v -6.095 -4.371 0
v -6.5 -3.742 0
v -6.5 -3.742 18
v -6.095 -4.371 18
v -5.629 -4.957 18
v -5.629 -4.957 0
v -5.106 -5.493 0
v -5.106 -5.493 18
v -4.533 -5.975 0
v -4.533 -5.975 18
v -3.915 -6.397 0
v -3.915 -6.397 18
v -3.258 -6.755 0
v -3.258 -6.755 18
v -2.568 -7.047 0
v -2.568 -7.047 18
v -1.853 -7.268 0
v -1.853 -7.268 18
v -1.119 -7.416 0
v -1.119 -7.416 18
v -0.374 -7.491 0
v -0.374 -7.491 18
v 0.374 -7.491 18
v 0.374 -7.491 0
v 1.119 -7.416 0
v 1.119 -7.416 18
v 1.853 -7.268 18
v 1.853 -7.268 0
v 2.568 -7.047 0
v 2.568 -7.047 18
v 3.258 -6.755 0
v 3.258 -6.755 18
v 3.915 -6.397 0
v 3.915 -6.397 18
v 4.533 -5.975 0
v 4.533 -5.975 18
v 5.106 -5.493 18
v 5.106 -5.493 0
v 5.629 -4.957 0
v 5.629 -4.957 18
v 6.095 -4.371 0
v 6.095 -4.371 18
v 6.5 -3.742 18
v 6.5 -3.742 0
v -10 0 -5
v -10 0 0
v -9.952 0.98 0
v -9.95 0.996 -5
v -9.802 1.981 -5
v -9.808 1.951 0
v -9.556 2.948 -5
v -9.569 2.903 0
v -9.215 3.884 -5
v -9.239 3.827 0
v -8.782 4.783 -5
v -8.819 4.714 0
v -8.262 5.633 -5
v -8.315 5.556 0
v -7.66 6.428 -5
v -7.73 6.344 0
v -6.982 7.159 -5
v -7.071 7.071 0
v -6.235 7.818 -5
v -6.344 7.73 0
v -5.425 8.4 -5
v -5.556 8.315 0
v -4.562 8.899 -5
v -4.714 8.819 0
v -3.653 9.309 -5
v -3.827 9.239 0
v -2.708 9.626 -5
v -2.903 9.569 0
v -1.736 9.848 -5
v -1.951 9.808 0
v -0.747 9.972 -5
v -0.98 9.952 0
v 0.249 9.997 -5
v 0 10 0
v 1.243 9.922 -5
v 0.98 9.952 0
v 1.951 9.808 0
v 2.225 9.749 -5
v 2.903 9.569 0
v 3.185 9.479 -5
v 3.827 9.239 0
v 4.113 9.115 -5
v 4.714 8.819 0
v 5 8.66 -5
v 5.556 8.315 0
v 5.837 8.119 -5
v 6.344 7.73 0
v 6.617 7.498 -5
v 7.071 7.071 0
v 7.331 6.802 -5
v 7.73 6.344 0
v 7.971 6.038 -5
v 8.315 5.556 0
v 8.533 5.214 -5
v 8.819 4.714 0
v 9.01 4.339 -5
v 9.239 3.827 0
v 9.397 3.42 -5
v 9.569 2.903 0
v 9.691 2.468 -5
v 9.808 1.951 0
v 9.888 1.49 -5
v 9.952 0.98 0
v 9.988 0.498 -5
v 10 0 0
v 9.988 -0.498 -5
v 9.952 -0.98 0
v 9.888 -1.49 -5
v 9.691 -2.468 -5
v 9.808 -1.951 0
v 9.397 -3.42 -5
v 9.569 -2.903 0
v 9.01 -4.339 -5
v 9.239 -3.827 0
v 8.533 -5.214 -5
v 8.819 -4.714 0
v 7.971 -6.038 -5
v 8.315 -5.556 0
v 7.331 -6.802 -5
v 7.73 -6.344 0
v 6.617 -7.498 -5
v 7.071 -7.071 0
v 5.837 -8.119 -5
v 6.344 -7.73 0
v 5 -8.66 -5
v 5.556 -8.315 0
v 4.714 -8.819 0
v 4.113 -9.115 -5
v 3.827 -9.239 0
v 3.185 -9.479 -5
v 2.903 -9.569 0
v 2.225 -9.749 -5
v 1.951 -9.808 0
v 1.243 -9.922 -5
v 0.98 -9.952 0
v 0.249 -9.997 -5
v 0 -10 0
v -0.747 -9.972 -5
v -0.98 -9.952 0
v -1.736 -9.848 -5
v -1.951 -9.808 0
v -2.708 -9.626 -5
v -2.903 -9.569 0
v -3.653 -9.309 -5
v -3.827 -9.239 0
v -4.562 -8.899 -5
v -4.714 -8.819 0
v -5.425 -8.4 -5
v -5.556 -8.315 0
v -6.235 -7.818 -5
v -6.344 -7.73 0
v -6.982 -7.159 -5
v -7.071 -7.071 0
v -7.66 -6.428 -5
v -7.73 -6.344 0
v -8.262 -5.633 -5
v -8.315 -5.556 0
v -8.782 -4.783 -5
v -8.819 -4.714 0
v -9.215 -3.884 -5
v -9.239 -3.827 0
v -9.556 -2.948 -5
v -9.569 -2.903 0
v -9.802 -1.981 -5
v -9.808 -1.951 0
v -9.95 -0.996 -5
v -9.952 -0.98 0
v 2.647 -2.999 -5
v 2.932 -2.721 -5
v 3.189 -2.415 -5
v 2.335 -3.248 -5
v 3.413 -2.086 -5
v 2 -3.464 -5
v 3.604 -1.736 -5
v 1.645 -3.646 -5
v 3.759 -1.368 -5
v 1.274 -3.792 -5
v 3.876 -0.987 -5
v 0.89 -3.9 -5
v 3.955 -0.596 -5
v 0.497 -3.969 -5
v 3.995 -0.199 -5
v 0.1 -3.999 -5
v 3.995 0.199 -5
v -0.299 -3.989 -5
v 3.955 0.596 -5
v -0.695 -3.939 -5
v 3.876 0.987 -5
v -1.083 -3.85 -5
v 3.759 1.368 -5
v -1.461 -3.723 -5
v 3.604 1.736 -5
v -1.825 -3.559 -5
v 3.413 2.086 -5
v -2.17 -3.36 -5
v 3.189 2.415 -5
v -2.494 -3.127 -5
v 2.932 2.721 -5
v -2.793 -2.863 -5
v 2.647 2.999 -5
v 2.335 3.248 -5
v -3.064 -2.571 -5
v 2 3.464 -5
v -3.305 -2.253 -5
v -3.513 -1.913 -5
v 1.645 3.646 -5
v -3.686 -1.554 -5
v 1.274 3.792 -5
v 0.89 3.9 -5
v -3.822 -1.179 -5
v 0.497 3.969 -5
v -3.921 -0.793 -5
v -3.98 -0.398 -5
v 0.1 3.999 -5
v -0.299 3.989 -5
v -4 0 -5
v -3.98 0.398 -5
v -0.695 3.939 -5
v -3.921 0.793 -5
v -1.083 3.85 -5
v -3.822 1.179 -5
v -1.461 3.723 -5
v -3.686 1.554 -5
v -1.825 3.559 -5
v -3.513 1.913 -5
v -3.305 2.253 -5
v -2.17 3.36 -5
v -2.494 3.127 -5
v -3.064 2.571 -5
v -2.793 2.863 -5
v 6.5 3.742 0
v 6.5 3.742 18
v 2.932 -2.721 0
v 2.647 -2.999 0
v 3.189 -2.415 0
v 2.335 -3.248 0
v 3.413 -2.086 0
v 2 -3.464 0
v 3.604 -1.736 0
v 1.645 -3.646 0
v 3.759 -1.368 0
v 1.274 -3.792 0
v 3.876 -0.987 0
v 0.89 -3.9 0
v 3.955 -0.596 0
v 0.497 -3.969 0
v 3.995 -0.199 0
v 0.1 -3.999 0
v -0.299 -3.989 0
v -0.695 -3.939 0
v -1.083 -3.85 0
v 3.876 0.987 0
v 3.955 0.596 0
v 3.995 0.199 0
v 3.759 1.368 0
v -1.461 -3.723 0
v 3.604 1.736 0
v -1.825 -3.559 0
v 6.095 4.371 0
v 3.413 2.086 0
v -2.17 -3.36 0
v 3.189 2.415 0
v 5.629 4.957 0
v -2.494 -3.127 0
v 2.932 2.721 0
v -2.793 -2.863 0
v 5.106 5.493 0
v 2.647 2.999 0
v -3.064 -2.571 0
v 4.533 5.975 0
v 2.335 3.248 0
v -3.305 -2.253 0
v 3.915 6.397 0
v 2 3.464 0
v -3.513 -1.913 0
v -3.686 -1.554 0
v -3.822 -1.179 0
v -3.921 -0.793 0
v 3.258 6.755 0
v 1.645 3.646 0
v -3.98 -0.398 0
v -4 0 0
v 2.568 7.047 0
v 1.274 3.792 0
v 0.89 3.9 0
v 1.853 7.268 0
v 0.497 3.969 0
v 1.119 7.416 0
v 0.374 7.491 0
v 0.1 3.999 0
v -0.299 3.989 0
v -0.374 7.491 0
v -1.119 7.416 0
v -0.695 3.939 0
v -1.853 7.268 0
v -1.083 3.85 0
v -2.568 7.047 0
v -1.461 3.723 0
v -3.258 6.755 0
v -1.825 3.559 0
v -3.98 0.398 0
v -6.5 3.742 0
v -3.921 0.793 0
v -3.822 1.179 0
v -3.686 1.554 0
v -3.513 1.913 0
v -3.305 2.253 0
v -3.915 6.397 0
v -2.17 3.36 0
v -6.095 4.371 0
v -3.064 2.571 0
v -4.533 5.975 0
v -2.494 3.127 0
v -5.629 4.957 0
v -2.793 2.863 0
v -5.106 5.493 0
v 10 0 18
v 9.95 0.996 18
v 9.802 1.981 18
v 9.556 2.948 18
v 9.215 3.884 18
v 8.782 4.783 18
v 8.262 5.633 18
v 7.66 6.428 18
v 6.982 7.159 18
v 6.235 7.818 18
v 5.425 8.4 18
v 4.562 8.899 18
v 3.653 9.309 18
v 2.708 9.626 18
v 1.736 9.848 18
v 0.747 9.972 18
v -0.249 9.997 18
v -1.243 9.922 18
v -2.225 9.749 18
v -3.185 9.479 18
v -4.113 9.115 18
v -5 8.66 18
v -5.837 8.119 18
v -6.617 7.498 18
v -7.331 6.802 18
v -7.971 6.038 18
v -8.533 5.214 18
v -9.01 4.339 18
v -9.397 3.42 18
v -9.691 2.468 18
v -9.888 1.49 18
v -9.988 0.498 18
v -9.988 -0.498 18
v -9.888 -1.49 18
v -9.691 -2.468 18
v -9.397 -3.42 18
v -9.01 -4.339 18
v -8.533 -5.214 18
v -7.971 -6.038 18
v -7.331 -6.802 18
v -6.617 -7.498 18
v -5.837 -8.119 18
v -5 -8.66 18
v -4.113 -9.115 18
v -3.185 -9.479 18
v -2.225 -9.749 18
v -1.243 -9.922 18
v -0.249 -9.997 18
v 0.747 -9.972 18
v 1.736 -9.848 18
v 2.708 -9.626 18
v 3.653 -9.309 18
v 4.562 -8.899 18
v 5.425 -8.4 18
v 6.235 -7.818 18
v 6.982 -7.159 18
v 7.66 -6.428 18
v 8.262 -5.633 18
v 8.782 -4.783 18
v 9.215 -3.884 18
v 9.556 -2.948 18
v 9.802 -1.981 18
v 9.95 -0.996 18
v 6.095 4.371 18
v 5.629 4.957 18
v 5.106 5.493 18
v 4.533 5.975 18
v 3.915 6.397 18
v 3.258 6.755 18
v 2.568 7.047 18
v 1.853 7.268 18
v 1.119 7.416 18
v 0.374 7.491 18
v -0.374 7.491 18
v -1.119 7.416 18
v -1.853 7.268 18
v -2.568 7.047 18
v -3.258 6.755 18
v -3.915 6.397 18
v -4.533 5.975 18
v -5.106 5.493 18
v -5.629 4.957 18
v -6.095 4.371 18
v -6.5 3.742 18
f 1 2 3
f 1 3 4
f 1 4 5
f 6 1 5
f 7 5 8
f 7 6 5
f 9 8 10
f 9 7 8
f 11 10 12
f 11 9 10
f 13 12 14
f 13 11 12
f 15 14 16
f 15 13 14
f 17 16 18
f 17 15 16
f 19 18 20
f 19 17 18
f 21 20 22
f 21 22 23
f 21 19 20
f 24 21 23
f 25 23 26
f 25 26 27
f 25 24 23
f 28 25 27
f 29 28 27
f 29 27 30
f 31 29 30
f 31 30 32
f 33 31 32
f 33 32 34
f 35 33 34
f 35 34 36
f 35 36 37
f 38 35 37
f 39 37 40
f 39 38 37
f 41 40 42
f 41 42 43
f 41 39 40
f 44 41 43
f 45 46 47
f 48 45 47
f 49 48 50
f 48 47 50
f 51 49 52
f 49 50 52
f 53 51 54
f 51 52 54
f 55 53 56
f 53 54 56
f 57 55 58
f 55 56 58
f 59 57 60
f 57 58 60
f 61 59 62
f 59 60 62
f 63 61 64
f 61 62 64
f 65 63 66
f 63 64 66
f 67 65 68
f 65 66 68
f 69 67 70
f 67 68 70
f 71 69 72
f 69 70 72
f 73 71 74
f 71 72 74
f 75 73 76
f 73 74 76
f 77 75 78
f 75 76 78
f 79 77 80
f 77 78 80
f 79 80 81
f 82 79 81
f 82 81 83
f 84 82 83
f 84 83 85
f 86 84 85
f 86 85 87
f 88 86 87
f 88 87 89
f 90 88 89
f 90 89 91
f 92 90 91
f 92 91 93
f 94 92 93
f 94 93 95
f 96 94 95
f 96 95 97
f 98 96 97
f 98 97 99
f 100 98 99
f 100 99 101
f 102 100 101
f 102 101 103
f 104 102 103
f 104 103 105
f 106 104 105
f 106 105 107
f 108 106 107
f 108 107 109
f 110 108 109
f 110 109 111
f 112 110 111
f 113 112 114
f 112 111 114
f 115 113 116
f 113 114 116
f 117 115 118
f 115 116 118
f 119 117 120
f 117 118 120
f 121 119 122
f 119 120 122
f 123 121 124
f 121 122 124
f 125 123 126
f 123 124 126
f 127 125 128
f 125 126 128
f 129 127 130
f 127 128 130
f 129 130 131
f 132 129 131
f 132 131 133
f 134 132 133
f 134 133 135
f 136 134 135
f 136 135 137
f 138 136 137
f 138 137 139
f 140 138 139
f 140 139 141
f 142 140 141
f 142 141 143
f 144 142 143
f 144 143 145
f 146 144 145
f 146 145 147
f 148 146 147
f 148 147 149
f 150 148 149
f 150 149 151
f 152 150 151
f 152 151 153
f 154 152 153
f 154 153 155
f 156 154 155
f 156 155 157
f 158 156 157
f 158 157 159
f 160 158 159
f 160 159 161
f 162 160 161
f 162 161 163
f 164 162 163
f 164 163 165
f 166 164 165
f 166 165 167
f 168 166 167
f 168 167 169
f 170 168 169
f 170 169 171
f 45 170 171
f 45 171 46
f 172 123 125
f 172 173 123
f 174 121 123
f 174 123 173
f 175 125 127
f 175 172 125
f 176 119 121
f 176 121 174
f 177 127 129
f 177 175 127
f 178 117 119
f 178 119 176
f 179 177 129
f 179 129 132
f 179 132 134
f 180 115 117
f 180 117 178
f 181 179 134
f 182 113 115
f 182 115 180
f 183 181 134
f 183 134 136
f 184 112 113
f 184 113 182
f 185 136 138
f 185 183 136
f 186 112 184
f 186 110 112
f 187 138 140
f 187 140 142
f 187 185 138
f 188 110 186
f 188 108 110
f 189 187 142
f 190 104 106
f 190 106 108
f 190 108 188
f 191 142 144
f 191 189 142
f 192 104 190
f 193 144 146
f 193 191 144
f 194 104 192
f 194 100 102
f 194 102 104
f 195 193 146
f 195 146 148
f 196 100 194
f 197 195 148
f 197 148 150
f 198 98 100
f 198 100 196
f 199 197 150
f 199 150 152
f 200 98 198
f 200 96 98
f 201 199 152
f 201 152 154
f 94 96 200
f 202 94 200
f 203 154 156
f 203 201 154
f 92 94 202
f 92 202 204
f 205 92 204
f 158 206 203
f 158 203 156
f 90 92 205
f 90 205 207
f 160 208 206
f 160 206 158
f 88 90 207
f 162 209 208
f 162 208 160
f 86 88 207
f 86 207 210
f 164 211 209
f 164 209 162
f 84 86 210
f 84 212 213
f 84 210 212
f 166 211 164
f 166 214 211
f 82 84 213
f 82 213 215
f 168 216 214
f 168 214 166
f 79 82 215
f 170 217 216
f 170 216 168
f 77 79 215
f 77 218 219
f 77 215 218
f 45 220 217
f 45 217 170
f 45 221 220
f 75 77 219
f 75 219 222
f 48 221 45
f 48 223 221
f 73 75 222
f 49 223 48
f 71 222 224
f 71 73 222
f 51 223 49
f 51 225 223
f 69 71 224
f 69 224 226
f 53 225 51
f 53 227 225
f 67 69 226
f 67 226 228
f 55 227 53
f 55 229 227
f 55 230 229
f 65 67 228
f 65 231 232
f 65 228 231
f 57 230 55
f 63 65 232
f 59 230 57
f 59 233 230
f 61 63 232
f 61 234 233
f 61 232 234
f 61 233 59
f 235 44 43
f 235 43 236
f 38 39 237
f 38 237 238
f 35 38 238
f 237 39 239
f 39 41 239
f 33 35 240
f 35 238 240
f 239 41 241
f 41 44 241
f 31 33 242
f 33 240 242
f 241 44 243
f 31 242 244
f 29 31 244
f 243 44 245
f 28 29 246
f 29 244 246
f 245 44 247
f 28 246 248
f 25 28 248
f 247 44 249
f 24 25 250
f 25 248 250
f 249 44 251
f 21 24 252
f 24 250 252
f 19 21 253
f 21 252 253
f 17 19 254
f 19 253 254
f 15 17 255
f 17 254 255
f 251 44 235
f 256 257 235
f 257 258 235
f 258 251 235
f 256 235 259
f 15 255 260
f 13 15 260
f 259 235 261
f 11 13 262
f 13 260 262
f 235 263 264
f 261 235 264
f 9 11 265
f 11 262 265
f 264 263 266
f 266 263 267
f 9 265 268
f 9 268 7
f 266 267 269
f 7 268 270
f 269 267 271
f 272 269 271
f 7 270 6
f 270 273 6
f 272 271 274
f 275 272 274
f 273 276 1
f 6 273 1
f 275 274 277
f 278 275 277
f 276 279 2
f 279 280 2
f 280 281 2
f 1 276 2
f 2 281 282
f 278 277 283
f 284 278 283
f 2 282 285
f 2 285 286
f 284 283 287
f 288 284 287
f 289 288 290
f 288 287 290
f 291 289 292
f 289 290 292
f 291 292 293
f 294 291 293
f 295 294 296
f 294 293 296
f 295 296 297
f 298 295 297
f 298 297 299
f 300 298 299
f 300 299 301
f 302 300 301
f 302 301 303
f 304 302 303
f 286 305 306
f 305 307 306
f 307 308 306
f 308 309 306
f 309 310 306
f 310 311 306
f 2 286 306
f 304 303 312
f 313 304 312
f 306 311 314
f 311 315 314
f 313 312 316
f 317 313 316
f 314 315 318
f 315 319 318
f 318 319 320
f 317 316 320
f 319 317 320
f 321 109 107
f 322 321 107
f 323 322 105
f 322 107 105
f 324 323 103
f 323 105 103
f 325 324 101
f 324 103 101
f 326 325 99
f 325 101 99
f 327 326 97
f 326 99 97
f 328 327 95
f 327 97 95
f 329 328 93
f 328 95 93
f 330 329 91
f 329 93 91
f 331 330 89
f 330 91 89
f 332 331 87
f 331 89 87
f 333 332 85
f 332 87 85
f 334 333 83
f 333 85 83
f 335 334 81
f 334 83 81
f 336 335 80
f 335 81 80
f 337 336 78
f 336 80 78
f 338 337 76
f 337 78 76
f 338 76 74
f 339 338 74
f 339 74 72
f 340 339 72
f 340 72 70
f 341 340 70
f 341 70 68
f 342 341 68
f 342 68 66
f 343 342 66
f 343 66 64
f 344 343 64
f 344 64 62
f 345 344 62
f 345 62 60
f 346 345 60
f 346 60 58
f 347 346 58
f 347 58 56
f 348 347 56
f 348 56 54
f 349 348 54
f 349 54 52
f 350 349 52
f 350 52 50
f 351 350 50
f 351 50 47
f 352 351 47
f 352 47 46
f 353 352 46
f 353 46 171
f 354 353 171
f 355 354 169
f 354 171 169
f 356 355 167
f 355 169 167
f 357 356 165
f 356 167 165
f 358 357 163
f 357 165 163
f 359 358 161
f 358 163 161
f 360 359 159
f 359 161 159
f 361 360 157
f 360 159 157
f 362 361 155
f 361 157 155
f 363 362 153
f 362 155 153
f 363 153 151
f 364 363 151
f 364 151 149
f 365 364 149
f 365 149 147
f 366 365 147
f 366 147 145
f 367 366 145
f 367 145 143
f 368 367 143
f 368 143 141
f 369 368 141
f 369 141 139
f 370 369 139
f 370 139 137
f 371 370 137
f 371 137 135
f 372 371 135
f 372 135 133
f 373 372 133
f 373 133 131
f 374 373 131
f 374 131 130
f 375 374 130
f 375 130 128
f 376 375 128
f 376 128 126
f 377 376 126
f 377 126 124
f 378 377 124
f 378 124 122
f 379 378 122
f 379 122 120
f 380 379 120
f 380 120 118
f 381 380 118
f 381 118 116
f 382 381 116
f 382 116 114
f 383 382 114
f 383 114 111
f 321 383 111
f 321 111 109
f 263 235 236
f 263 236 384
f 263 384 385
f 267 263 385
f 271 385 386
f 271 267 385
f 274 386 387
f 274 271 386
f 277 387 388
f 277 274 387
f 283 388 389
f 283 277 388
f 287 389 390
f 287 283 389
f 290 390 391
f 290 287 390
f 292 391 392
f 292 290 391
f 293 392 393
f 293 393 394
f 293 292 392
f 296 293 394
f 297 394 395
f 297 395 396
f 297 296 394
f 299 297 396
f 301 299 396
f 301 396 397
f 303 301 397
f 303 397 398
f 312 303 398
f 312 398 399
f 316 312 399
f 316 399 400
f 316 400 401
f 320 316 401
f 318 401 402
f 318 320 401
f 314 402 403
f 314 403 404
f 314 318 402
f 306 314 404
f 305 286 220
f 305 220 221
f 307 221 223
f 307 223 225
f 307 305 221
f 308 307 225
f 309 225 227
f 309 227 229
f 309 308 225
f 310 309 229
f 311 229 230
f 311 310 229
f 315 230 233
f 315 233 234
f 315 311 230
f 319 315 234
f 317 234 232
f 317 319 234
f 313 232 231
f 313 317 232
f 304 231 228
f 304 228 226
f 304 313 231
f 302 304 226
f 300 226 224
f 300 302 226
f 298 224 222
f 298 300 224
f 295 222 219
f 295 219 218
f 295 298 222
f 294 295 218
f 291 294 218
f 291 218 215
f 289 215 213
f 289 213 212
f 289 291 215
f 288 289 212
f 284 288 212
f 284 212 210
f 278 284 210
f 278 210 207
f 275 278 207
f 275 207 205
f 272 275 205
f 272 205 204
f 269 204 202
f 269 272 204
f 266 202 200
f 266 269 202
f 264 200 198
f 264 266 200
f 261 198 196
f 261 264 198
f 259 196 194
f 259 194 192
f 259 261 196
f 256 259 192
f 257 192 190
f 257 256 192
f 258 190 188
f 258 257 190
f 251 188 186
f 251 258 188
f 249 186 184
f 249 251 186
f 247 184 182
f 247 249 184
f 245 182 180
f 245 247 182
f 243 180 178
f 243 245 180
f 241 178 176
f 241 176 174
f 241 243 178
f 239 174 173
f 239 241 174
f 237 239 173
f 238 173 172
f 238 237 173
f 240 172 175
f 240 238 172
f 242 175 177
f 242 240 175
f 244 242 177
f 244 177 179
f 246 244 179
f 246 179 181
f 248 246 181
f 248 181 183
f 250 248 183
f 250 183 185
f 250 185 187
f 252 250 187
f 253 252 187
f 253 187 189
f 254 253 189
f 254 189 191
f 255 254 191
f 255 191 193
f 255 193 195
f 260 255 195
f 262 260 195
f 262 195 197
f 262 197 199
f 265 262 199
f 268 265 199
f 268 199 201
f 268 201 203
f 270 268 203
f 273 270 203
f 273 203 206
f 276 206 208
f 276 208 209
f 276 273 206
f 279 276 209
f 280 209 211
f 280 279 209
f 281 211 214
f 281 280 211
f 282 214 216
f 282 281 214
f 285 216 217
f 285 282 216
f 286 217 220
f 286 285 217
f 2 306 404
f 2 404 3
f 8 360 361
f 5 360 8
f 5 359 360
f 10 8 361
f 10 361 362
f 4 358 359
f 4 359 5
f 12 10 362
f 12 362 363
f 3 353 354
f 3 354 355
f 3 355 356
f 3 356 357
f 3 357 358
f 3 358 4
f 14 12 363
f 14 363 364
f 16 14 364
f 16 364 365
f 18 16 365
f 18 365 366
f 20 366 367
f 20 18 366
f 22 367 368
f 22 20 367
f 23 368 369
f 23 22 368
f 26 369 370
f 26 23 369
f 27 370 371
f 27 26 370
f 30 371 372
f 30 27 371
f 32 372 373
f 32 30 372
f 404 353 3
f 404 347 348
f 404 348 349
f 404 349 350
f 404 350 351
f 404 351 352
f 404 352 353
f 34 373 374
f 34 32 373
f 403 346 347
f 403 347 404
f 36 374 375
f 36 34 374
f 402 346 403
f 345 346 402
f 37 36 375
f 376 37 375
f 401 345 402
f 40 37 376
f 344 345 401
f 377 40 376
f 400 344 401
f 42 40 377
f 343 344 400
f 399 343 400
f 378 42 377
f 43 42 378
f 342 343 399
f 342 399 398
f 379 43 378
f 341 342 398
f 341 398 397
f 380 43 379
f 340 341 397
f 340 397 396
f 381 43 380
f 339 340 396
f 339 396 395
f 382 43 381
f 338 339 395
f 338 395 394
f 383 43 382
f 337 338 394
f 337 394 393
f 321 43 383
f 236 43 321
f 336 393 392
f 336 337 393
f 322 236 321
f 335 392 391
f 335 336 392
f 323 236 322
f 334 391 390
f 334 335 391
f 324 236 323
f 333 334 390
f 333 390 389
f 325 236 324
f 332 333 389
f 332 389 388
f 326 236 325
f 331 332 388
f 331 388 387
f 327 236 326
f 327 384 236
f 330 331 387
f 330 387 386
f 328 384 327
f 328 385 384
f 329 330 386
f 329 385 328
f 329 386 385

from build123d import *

# Parameters (mm, degrees)
SKETCH1_R           = 10
BOSS_EXTRUDE1_DEPTH = 18
SKETCH2_R           = 10
SKETCH2_R_2         = 4
BOSS_EXTRUDE2_DEPTH = 5


with BuildPart() as part:
    # Sketch1 → Boss-Extrude1 (new body)
    with BuildSketch(Plane.XY):
        Circle(SKETCH1_R)
        with BuildLine():
            Line((-6.5, 3.741657387), (-6.5, -3.741657387))
            ThreePointArc((-6.5, -3.741657387), (0, -7.5), (6.5, -3.741657387))
            Line((6.5, -3.741657387), (6.5, 3.741657387))
            ThreePointArc((6.5, 3.741657387), (0, 7.5), (-6.5, 3.741657387))
        make_face(mode=Mode.SUBTRACT)
    extrude(amount=BOSS_EXTRUDE1_DEPTH)

    # Sketch2 → Boss-Extrude2 (add)
    with BuildSketch(Plane(origin=(0, 0, 0), x_dir=(-1, 0, 0), z_dir=(0, 0, -1))):
        Circle(SKETCH2_R)
        Circle(SKETCH2_R_2, mode=Mode.SUBTRACT)
    extrude(amount=BOSS_EXTRUDE2_DEPTH)


solid = part.part
